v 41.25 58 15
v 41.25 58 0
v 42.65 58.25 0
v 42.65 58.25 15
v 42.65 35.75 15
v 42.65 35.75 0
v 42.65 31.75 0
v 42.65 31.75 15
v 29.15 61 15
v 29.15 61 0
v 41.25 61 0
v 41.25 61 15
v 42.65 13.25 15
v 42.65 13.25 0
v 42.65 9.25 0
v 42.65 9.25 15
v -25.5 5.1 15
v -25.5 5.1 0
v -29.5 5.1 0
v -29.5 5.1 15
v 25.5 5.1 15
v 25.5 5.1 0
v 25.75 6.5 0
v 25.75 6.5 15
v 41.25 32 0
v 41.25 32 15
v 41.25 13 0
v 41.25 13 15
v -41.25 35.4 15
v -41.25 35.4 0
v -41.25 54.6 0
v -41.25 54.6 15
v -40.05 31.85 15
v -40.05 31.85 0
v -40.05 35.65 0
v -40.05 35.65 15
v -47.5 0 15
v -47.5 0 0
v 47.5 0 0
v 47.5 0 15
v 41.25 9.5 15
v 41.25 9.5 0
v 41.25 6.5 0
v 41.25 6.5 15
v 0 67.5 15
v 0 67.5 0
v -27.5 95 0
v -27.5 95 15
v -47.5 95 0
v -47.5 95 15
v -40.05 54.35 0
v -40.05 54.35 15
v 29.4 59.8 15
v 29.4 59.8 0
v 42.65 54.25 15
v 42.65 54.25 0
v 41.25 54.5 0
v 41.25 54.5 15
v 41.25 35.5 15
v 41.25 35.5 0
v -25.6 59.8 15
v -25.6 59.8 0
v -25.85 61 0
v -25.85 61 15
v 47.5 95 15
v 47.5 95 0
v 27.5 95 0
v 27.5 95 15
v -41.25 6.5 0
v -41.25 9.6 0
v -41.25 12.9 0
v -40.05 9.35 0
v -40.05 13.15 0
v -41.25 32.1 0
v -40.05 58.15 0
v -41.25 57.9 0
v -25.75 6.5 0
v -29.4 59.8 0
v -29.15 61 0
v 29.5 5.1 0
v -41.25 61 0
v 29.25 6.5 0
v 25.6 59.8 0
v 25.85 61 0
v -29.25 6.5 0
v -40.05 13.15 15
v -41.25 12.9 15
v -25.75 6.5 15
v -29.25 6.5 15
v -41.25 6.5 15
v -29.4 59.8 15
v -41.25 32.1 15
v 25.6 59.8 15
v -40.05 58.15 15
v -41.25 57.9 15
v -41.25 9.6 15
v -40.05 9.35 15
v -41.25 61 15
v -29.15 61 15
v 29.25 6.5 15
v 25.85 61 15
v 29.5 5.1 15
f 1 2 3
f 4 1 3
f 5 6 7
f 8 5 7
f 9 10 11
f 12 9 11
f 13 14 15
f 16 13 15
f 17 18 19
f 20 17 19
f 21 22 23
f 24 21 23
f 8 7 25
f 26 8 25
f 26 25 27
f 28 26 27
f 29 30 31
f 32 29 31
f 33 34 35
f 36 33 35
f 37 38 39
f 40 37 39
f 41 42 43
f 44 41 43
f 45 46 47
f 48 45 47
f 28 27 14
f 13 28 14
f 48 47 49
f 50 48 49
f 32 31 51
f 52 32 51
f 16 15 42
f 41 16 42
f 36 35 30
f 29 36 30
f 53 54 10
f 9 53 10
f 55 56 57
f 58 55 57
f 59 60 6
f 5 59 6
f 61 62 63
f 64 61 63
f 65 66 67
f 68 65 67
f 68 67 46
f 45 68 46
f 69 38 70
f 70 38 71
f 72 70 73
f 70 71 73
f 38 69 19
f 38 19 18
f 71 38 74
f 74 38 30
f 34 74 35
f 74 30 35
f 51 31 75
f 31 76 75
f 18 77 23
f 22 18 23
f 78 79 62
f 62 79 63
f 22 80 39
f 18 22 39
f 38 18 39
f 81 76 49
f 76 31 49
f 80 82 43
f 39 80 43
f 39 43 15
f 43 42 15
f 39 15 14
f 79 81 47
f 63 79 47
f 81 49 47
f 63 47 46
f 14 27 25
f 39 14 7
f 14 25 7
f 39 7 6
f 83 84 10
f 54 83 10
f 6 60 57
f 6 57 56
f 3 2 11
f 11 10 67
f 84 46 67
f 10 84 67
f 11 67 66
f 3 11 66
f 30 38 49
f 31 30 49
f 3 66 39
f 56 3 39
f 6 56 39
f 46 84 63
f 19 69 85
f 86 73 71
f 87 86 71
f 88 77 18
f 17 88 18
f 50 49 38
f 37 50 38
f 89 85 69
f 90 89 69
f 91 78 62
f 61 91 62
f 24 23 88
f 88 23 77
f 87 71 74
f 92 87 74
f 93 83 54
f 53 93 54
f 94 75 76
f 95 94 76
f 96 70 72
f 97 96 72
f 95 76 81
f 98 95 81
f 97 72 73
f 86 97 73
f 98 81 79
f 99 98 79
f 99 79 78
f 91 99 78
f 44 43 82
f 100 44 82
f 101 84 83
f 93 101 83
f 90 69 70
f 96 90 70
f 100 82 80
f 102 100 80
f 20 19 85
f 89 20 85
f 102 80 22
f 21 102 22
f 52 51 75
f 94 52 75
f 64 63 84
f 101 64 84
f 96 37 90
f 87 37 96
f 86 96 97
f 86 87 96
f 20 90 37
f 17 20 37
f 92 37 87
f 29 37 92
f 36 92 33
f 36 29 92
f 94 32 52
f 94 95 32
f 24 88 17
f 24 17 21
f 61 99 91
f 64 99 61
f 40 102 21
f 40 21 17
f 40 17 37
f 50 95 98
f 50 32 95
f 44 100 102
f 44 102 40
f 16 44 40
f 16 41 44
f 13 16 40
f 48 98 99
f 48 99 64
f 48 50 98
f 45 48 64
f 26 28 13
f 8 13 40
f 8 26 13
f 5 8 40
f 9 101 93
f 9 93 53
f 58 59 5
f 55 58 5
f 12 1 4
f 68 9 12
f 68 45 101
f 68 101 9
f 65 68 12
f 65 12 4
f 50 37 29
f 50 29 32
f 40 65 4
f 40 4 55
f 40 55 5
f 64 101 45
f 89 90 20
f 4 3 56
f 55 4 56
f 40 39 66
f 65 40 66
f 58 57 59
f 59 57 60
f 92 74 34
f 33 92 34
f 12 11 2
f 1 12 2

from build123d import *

# Parameters (mm, degrees)
PAD_DEPTH = 15


with BuildPart() as part:
    # Sketch → Pad (new body)
    with BuildSketch(Plane.XY):
        Polygon((0, 67.5), (-27.5, 95), (-47.5, 95), (-47.5, 0), (47.5, 0), (47.5, 95), (27.5, 95), align=None)
        Polygon((-41.25, 61), (-29.15, 61), (-29.4, 59.8), (-25.6, 59.8), (-25.85, 61), (25.85, 61), (25.6, 59.8), (29.4, 59.8), (29.15, 61), (41.25, 61), (41.25, 58), (42.65, 58.25), (42.65, 54.25), (41.25, 54.5), (41.25, 35.5), (42.65, 35.75), (42.65, 31.75), (41.25, 32), (41.25, 13), (42.65, 13.25), (42.65, 9.25), (41.25, 9.5), (41.25, 6.5), (29.25, 6.5), (29.5, 5.1), (25.5, 5.1), (25.75, 6.5), (-25.75, 6.5), (-25.5, 5.1), (-29.5, 5.1), (-29.25, 6.5), (-41.25, 6.5), (-41.25, 9.6), (-40.05, 9.35), (-40.05, 13.15), (-41.25, 12.9), (-41.25, 32.1), (-40.05, 31.85), (-40.05, 35.65), (-41.25, 35.4), (-41.25, 54.6), (-40.05, 54.35), (-40.05, 58.15), (-41.25, 57.9), align=None, mode=Mode.SUBTRACT)
    extrude(amount=PAD_DEPTH)


solid = part.part
